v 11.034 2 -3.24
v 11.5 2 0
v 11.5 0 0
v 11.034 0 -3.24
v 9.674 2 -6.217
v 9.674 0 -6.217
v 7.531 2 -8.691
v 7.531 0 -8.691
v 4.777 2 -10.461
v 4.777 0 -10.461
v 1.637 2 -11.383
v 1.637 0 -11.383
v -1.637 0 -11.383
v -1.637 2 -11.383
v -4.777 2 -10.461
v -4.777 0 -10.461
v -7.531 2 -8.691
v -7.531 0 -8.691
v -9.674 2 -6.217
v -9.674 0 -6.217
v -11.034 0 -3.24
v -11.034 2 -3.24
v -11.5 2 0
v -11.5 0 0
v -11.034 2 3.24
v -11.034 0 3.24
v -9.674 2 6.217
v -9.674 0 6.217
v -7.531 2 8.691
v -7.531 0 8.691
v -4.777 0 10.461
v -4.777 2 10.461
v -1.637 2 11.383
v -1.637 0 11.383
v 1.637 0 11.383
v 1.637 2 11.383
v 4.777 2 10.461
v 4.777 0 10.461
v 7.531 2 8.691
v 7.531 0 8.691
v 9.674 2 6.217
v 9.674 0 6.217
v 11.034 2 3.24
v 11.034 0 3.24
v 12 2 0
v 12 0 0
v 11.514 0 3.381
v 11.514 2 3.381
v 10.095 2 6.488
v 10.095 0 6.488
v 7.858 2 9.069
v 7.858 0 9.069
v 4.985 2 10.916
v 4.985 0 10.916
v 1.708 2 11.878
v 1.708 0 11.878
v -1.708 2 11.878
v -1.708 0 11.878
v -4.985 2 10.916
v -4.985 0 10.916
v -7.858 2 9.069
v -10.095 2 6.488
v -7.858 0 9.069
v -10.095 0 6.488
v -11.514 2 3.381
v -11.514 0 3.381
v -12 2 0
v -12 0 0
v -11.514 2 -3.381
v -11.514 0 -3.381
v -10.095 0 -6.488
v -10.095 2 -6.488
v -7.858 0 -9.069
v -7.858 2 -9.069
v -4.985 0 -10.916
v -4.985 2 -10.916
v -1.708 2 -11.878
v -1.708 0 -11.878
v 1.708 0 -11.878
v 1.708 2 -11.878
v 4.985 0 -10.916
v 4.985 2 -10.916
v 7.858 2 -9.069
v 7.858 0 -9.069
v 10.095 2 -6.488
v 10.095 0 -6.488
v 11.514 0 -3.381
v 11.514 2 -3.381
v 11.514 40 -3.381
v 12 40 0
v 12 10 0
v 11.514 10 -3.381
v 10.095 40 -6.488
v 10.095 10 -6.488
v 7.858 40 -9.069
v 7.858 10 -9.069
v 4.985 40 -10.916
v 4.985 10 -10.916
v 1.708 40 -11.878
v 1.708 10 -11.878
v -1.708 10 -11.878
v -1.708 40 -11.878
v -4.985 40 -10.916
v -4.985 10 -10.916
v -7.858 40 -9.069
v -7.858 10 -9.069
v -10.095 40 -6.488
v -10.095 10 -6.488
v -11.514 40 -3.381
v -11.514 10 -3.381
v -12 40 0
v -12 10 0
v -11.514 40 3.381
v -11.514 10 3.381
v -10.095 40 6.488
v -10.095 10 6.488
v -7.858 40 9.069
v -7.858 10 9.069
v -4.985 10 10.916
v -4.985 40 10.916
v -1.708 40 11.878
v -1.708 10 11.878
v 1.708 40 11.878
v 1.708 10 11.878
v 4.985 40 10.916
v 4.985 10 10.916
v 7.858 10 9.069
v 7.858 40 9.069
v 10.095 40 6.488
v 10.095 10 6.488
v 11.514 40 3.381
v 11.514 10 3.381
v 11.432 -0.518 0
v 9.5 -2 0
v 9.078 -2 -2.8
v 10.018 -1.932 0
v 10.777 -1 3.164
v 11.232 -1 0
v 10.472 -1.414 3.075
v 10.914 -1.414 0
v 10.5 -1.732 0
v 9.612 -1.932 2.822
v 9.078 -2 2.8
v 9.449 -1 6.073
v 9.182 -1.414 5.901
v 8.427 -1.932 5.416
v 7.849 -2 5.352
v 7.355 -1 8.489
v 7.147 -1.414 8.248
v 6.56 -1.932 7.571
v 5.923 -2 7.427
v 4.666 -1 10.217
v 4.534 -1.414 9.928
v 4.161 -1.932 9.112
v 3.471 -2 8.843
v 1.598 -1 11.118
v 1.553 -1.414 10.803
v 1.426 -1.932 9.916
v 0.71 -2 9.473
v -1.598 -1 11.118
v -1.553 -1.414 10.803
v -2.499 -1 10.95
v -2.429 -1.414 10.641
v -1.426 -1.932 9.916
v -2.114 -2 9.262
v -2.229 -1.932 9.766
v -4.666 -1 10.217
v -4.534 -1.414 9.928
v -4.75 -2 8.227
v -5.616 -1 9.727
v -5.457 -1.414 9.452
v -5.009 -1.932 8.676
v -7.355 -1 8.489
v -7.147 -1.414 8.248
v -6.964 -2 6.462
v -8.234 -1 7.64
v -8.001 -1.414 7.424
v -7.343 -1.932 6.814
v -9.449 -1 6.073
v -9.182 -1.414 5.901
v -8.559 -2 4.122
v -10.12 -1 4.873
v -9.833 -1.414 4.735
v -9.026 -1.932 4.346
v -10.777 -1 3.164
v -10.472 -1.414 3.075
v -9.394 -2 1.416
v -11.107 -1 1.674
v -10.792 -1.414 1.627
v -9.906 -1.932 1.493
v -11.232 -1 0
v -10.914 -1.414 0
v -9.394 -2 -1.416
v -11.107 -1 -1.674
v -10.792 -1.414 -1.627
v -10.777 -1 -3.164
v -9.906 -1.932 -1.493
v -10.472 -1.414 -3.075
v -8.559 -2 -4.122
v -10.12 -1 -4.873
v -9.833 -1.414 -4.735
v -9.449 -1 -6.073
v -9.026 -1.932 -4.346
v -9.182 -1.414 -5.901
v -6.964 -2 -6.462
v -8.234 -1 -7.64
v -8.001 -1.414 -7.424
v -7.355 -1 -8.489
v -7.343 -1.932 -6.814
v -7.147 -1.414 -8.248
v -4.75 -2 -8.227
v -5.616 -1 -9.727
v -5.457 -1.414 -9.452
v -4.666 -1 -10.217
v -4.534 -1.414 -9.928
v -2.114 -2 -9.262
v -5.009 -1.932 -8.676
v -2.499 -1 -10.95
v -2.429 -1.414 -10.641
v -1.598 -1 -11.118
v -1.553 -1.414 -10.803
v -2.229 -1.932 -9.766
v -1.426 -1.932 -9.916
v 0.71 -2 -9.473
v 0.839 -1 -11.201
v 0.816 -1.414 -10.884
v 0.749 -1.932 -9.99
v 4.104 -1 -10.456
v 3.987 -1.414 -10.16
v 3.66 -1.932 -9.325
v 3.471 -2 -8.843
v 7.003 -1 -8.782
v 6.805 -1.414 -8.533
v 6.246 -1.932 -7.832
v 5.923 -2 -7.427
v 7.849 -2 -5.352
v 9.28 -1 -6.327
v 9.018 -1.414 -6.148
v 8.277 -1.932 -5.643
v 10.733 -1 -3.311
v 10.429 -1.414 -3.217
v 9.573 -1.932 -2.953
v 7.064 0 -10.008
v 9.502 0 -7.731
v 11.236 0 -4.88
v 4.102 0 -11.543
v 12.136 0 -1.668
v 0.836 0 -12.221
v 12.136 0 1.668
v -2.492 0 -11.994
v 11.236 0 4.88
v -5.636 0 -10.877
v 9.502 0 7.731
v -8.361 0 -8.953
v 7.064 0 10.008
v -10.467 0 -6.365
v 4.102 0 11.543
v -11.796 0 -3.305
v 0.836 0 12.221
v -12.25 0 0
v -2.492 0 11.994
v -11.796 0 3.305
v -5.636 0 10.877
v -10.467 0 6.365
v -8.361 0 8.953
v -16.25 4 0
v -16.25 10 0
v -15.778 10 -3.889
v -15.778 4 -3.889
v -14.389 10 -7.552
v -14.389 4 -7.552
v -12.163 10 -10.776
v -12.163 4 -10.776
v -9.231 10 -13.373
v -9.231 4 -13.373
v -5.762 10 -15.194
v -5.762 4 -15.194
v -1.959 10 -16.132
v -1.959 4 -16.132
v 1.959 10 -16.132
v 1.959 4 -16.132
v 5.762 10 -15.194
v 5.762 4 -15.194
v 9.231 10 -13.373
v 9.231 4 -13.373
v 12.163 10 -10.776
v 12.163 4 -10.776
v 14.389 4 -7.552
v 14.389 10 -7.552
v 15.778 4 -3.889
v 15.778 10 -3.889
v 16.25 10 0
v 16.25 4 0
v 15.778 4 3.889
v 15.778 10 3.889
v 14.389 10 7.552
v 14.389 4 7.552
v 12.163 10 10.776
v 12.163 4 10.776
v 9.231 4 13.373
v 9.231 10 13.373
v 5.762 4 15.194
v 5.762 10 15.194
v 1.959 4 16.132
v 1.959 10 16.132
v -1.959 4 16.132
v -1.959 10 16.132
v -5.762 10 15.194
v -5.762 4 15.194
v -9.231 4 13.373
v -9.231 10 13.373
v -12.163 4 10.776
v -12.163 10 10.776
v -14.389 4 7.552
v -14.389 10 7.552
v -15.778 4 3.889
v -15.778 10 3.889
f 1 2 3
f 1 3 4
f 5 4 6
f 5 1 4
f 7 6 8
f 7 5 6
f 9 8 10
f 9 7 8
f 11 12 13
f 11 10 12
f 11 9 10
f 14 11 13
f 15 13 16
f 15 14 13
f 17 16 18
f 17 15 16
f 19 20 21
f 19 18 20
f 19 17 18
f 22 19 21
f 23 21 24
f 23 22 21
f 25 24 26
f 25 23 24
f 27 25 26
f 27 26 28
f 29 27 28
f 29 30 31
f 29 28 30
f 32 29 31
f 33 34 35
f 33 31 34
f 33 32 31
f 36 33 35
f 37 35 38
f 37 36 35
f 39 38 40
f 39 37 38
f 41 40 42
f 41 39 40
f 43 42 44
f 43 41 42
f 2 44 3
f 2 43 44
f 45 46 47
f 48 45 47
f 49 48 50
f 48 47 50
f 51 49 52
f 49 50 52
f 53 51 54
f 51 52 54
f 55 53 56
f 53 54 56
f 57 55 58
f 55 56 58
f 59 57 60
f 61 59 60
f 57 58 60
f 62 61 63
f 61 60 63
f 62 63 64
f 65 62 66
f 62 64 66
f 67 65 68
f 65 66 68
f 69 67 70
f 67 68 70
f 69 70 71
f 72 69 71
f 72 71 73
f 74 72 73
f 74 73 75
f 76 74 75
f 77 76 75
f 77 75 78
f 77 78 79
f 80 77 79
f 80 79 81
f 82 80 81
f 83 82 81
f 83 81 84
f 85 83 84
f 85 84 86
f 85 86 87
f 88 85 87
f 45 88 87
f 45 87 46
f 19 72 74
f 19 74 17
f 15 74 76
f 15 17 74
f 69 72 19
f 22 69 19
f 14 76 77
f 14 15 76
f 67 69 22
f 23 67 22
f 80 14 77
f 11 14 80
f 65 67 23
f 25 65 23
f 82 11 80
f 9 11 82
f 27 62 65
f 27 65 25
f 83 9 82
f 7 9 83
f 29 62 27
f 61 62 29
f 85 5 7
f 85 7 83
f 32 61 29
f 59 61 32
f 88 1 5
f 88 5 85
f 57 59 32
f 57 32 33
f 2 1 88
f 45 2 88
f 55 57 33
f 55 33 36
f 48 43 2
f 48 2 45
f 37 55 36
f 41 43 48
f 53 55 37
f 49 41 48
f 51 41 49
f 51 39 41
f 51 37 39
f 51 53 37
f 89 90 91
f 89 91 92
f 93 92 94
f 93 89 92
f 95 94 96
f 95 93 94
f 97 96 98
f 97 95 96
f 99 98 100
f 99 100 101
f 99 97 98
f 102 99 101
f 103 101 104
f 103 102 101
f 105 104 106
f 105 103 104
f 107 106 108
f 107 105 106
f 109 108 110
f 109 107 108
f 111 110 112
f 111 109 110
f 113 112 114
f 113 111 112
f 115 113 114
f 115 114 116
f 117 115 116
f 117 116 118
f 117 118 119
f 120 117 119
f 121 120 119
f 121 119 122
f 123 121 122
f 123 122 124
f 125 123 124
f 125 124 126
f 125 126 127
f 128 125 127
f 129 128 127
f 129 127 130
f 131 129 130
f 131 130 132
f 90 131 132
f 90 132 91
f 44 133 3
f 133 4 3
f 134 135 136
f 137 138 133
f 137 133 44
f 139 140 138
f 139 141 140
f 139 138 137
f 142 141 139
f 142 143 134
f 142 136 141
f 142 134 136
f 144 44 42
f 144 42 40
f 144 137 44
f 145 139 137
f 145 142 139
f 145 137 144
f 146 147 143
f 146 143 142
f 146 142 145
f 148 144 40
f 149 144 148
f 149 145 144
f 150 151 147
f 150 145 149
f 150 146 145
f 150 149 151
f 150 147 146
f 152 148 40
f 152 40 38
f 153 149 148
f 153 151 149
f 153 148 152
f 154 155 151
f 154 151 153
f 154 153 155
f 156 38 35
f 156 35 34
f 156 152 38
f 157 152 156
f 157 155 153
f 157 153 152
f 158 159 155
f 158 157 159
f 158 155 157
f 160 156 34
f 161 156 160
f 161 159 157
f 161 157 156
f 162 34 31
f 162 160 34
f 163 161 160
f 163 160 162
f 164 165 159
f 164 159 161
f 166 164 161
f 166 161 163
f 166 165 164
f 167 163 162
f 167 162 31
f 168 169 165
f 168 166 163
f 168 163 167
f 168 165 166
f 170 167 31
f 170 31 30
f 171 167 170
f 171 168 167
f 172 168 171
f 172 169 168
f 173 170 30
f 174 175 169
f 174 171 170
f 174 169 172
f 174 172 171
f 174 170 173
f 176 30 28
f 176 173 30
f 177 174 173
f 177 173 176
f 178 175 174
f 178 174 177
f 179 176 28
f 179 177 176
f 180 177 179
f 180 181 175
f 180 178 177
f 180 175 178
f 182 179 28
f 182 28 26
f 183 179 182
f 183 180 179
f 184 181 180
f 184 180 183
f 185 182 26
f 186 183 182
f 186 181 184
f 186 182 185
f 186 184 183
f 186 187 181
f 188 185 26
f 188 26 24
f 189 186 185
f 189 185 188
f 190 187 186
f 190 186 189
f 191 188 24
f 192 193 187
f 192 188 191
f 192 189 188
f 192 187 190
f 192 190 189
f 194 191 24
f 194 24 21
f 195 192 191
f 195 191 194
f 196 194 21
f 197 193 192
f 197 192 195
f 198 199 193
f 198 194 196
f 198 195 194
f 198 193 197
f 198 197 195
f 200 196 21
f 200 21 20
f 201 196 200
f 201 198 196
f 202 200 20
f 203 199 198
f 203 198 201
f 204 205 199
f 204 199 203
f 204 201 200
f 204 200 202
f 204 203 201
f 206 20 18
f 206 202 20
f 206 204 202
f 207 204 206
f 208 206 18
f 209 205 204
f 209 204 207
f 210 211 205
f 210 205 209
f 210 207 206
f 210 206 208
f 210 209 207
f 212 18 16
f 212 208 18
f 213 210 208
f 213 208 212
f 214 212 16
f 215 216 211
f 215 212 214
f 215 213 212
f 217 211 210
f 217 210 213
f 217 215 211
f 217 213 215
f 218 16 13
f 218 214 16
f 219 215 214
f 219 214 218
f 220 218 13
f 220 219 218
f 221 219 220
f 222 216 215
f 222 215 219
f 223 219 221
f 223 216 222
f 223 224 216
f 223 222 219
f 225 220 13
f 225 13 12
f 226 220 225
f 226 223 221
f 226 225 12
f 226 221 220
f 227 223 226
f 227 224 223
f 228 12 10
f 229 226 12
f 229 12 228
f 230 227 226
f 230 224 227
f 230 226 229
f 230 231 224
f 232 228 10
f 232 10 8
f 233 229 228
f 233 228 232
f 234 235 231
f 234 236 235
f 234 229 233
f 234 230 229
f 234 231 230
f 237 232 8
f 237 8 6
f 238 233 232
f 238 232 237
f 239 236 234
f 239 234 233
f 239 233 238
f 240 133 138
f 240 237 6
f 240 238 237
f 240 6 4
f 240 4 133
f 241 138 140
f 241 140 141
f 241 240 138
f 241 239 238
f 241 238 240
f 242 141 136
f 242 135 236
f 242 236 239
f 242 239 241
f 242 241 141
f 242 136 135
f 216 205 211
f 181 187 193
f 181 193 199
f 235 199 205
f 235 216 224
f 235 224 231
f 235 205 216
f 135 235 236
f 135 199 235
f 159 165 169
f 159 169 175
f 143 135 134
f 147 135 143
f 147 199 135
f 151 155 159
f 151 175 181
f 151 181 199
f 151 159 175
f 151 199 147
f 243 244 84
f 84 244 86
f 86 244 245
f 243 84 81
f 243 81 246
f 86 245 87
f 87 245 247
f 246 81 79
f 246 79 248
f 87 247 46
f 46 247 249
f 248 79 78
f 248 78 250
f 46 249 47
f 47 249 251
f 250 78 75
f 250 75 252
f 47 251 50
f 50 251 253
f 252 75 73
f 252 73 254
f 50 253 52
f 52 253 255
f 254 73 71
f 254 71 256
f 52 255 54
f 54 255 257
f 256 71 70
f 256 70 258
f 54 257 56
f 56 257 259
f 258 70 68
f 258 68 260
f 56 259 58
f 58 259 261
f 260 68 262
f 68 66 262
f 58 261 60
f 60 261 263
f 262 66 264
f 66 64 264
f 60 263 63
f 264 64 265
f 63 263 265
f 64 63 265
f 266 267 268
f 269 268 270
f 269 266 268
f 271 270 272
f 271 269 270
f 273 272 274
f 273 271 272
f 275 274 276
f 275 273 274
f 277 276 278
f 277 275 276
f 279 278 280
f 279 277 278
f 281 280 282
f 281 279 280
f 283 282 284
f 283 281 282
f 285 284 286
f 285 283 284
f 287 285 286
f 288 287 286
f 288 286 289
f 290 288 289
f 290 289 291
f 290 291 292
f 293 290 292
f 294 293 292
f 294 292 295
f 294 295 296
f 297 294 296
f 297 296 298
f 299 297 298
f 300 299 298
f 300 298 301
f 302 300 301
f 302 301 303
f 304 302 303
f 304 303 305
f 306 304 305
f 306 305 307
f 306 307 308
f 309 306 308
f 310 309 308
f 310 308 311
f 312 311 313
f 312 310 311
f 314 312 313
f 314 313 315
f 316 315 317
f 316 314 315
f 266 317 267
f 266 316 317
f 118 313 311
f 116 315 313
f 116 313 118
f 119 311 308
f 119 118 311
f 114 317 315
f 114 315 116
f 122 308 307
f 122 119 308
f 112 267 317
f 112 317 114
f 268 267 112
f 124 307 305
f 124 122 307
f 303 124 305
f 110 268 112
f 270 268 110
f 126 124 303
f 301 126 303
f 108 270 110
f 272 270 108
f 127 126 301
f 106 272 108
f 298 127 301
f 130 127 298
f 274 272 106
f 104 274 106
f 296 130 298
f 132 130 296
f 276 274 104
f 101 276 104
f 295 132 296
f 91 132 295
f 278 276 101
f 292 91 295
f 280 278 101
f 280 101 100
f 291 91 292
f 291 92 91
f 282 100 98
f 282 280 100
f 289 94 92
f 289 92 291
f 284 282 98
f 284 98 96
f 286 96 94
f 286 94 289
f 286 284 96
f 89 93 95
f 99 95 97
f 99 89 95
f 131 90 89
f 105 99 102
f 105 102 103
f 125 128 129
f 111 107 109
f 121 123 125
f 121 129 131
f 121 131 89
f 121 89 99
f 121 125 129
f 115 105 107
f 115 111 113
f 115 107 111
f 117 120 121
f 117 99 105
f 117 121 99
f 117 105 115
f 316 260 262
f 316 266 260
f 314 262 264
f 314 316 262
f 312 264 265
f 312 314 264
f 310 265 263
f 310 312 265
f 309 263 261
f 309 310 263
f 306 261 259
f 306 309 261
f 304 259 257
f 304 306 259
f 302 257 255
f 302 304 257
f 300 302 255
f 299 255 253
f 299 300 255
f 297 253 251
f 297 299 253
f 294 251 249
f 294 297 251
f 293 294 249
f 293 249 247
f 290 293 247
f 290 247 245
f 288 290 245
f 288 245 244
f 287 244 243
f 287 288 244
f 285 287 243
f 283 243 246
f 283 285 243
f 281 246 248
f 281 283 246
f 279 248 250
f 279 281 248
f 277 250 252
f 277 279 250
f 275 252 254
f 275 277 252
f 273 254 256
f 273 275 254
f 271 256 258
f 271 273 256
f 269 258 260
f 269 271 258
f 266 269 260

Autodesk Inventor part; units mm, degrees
ref_plane "YZ Plane" through (0, 0, 0) normal (1, 0, 0) x (0, 1, 0)
ref_plane "XZ Plane" through (0, 0, 0) normal (0, 1, 0) x (-1, 0, 0)
ref_plane "XY Plane" through (0, 0, 0) normal (0, 0, 1) x (1, 0, 0)
sketch "Sketch1" plane through (0, 0, 0) normal (0, 1, 0) x (-1, 0, 0)
  circle A0 centre (0, 0) radius 16.25
  dimension "d0" = 32.5
extrude "Extrusion1" add sketch "Sketch1" along normal blind 40
chamfer "Chamfer1" distance 4 angle 45 1 edges at (16.25, 0, 0)
sketch "Sketch2" plane through (0, 40, 0) normal (0, 1, 0) x (1, 0, 0)
  circle A0 centre (0, 0) radius 12
  circle A1 centre (0, 0) radius 16.25
  dimension "d6" = 24
extrude "Extrusion2" cut sketch "Sketch2" against normal blind 30
sketch "Sketch3" plane through (0, 0, 0) normal (0, -1, 0) x (1, 0, 0)
  circle A0 centre (0, 0) radius 12
extrude "Extrusion3" cut sketch "Sketch3" against normal blind 2
sketch "Sketch4" plane through (0, 2, 0) normal (0, -1, 0) x (1, 0, 0)
  circle A0 centre (0, 0) radius 11.5
  dimension "d11" = 23
extrude "Extrusion4" add sketch "Sketch4" along normal blind 4
fillet "Fillet1" radius 2 1 edges at (-11.5, -2, 0)
properties part number "Buton_1"
